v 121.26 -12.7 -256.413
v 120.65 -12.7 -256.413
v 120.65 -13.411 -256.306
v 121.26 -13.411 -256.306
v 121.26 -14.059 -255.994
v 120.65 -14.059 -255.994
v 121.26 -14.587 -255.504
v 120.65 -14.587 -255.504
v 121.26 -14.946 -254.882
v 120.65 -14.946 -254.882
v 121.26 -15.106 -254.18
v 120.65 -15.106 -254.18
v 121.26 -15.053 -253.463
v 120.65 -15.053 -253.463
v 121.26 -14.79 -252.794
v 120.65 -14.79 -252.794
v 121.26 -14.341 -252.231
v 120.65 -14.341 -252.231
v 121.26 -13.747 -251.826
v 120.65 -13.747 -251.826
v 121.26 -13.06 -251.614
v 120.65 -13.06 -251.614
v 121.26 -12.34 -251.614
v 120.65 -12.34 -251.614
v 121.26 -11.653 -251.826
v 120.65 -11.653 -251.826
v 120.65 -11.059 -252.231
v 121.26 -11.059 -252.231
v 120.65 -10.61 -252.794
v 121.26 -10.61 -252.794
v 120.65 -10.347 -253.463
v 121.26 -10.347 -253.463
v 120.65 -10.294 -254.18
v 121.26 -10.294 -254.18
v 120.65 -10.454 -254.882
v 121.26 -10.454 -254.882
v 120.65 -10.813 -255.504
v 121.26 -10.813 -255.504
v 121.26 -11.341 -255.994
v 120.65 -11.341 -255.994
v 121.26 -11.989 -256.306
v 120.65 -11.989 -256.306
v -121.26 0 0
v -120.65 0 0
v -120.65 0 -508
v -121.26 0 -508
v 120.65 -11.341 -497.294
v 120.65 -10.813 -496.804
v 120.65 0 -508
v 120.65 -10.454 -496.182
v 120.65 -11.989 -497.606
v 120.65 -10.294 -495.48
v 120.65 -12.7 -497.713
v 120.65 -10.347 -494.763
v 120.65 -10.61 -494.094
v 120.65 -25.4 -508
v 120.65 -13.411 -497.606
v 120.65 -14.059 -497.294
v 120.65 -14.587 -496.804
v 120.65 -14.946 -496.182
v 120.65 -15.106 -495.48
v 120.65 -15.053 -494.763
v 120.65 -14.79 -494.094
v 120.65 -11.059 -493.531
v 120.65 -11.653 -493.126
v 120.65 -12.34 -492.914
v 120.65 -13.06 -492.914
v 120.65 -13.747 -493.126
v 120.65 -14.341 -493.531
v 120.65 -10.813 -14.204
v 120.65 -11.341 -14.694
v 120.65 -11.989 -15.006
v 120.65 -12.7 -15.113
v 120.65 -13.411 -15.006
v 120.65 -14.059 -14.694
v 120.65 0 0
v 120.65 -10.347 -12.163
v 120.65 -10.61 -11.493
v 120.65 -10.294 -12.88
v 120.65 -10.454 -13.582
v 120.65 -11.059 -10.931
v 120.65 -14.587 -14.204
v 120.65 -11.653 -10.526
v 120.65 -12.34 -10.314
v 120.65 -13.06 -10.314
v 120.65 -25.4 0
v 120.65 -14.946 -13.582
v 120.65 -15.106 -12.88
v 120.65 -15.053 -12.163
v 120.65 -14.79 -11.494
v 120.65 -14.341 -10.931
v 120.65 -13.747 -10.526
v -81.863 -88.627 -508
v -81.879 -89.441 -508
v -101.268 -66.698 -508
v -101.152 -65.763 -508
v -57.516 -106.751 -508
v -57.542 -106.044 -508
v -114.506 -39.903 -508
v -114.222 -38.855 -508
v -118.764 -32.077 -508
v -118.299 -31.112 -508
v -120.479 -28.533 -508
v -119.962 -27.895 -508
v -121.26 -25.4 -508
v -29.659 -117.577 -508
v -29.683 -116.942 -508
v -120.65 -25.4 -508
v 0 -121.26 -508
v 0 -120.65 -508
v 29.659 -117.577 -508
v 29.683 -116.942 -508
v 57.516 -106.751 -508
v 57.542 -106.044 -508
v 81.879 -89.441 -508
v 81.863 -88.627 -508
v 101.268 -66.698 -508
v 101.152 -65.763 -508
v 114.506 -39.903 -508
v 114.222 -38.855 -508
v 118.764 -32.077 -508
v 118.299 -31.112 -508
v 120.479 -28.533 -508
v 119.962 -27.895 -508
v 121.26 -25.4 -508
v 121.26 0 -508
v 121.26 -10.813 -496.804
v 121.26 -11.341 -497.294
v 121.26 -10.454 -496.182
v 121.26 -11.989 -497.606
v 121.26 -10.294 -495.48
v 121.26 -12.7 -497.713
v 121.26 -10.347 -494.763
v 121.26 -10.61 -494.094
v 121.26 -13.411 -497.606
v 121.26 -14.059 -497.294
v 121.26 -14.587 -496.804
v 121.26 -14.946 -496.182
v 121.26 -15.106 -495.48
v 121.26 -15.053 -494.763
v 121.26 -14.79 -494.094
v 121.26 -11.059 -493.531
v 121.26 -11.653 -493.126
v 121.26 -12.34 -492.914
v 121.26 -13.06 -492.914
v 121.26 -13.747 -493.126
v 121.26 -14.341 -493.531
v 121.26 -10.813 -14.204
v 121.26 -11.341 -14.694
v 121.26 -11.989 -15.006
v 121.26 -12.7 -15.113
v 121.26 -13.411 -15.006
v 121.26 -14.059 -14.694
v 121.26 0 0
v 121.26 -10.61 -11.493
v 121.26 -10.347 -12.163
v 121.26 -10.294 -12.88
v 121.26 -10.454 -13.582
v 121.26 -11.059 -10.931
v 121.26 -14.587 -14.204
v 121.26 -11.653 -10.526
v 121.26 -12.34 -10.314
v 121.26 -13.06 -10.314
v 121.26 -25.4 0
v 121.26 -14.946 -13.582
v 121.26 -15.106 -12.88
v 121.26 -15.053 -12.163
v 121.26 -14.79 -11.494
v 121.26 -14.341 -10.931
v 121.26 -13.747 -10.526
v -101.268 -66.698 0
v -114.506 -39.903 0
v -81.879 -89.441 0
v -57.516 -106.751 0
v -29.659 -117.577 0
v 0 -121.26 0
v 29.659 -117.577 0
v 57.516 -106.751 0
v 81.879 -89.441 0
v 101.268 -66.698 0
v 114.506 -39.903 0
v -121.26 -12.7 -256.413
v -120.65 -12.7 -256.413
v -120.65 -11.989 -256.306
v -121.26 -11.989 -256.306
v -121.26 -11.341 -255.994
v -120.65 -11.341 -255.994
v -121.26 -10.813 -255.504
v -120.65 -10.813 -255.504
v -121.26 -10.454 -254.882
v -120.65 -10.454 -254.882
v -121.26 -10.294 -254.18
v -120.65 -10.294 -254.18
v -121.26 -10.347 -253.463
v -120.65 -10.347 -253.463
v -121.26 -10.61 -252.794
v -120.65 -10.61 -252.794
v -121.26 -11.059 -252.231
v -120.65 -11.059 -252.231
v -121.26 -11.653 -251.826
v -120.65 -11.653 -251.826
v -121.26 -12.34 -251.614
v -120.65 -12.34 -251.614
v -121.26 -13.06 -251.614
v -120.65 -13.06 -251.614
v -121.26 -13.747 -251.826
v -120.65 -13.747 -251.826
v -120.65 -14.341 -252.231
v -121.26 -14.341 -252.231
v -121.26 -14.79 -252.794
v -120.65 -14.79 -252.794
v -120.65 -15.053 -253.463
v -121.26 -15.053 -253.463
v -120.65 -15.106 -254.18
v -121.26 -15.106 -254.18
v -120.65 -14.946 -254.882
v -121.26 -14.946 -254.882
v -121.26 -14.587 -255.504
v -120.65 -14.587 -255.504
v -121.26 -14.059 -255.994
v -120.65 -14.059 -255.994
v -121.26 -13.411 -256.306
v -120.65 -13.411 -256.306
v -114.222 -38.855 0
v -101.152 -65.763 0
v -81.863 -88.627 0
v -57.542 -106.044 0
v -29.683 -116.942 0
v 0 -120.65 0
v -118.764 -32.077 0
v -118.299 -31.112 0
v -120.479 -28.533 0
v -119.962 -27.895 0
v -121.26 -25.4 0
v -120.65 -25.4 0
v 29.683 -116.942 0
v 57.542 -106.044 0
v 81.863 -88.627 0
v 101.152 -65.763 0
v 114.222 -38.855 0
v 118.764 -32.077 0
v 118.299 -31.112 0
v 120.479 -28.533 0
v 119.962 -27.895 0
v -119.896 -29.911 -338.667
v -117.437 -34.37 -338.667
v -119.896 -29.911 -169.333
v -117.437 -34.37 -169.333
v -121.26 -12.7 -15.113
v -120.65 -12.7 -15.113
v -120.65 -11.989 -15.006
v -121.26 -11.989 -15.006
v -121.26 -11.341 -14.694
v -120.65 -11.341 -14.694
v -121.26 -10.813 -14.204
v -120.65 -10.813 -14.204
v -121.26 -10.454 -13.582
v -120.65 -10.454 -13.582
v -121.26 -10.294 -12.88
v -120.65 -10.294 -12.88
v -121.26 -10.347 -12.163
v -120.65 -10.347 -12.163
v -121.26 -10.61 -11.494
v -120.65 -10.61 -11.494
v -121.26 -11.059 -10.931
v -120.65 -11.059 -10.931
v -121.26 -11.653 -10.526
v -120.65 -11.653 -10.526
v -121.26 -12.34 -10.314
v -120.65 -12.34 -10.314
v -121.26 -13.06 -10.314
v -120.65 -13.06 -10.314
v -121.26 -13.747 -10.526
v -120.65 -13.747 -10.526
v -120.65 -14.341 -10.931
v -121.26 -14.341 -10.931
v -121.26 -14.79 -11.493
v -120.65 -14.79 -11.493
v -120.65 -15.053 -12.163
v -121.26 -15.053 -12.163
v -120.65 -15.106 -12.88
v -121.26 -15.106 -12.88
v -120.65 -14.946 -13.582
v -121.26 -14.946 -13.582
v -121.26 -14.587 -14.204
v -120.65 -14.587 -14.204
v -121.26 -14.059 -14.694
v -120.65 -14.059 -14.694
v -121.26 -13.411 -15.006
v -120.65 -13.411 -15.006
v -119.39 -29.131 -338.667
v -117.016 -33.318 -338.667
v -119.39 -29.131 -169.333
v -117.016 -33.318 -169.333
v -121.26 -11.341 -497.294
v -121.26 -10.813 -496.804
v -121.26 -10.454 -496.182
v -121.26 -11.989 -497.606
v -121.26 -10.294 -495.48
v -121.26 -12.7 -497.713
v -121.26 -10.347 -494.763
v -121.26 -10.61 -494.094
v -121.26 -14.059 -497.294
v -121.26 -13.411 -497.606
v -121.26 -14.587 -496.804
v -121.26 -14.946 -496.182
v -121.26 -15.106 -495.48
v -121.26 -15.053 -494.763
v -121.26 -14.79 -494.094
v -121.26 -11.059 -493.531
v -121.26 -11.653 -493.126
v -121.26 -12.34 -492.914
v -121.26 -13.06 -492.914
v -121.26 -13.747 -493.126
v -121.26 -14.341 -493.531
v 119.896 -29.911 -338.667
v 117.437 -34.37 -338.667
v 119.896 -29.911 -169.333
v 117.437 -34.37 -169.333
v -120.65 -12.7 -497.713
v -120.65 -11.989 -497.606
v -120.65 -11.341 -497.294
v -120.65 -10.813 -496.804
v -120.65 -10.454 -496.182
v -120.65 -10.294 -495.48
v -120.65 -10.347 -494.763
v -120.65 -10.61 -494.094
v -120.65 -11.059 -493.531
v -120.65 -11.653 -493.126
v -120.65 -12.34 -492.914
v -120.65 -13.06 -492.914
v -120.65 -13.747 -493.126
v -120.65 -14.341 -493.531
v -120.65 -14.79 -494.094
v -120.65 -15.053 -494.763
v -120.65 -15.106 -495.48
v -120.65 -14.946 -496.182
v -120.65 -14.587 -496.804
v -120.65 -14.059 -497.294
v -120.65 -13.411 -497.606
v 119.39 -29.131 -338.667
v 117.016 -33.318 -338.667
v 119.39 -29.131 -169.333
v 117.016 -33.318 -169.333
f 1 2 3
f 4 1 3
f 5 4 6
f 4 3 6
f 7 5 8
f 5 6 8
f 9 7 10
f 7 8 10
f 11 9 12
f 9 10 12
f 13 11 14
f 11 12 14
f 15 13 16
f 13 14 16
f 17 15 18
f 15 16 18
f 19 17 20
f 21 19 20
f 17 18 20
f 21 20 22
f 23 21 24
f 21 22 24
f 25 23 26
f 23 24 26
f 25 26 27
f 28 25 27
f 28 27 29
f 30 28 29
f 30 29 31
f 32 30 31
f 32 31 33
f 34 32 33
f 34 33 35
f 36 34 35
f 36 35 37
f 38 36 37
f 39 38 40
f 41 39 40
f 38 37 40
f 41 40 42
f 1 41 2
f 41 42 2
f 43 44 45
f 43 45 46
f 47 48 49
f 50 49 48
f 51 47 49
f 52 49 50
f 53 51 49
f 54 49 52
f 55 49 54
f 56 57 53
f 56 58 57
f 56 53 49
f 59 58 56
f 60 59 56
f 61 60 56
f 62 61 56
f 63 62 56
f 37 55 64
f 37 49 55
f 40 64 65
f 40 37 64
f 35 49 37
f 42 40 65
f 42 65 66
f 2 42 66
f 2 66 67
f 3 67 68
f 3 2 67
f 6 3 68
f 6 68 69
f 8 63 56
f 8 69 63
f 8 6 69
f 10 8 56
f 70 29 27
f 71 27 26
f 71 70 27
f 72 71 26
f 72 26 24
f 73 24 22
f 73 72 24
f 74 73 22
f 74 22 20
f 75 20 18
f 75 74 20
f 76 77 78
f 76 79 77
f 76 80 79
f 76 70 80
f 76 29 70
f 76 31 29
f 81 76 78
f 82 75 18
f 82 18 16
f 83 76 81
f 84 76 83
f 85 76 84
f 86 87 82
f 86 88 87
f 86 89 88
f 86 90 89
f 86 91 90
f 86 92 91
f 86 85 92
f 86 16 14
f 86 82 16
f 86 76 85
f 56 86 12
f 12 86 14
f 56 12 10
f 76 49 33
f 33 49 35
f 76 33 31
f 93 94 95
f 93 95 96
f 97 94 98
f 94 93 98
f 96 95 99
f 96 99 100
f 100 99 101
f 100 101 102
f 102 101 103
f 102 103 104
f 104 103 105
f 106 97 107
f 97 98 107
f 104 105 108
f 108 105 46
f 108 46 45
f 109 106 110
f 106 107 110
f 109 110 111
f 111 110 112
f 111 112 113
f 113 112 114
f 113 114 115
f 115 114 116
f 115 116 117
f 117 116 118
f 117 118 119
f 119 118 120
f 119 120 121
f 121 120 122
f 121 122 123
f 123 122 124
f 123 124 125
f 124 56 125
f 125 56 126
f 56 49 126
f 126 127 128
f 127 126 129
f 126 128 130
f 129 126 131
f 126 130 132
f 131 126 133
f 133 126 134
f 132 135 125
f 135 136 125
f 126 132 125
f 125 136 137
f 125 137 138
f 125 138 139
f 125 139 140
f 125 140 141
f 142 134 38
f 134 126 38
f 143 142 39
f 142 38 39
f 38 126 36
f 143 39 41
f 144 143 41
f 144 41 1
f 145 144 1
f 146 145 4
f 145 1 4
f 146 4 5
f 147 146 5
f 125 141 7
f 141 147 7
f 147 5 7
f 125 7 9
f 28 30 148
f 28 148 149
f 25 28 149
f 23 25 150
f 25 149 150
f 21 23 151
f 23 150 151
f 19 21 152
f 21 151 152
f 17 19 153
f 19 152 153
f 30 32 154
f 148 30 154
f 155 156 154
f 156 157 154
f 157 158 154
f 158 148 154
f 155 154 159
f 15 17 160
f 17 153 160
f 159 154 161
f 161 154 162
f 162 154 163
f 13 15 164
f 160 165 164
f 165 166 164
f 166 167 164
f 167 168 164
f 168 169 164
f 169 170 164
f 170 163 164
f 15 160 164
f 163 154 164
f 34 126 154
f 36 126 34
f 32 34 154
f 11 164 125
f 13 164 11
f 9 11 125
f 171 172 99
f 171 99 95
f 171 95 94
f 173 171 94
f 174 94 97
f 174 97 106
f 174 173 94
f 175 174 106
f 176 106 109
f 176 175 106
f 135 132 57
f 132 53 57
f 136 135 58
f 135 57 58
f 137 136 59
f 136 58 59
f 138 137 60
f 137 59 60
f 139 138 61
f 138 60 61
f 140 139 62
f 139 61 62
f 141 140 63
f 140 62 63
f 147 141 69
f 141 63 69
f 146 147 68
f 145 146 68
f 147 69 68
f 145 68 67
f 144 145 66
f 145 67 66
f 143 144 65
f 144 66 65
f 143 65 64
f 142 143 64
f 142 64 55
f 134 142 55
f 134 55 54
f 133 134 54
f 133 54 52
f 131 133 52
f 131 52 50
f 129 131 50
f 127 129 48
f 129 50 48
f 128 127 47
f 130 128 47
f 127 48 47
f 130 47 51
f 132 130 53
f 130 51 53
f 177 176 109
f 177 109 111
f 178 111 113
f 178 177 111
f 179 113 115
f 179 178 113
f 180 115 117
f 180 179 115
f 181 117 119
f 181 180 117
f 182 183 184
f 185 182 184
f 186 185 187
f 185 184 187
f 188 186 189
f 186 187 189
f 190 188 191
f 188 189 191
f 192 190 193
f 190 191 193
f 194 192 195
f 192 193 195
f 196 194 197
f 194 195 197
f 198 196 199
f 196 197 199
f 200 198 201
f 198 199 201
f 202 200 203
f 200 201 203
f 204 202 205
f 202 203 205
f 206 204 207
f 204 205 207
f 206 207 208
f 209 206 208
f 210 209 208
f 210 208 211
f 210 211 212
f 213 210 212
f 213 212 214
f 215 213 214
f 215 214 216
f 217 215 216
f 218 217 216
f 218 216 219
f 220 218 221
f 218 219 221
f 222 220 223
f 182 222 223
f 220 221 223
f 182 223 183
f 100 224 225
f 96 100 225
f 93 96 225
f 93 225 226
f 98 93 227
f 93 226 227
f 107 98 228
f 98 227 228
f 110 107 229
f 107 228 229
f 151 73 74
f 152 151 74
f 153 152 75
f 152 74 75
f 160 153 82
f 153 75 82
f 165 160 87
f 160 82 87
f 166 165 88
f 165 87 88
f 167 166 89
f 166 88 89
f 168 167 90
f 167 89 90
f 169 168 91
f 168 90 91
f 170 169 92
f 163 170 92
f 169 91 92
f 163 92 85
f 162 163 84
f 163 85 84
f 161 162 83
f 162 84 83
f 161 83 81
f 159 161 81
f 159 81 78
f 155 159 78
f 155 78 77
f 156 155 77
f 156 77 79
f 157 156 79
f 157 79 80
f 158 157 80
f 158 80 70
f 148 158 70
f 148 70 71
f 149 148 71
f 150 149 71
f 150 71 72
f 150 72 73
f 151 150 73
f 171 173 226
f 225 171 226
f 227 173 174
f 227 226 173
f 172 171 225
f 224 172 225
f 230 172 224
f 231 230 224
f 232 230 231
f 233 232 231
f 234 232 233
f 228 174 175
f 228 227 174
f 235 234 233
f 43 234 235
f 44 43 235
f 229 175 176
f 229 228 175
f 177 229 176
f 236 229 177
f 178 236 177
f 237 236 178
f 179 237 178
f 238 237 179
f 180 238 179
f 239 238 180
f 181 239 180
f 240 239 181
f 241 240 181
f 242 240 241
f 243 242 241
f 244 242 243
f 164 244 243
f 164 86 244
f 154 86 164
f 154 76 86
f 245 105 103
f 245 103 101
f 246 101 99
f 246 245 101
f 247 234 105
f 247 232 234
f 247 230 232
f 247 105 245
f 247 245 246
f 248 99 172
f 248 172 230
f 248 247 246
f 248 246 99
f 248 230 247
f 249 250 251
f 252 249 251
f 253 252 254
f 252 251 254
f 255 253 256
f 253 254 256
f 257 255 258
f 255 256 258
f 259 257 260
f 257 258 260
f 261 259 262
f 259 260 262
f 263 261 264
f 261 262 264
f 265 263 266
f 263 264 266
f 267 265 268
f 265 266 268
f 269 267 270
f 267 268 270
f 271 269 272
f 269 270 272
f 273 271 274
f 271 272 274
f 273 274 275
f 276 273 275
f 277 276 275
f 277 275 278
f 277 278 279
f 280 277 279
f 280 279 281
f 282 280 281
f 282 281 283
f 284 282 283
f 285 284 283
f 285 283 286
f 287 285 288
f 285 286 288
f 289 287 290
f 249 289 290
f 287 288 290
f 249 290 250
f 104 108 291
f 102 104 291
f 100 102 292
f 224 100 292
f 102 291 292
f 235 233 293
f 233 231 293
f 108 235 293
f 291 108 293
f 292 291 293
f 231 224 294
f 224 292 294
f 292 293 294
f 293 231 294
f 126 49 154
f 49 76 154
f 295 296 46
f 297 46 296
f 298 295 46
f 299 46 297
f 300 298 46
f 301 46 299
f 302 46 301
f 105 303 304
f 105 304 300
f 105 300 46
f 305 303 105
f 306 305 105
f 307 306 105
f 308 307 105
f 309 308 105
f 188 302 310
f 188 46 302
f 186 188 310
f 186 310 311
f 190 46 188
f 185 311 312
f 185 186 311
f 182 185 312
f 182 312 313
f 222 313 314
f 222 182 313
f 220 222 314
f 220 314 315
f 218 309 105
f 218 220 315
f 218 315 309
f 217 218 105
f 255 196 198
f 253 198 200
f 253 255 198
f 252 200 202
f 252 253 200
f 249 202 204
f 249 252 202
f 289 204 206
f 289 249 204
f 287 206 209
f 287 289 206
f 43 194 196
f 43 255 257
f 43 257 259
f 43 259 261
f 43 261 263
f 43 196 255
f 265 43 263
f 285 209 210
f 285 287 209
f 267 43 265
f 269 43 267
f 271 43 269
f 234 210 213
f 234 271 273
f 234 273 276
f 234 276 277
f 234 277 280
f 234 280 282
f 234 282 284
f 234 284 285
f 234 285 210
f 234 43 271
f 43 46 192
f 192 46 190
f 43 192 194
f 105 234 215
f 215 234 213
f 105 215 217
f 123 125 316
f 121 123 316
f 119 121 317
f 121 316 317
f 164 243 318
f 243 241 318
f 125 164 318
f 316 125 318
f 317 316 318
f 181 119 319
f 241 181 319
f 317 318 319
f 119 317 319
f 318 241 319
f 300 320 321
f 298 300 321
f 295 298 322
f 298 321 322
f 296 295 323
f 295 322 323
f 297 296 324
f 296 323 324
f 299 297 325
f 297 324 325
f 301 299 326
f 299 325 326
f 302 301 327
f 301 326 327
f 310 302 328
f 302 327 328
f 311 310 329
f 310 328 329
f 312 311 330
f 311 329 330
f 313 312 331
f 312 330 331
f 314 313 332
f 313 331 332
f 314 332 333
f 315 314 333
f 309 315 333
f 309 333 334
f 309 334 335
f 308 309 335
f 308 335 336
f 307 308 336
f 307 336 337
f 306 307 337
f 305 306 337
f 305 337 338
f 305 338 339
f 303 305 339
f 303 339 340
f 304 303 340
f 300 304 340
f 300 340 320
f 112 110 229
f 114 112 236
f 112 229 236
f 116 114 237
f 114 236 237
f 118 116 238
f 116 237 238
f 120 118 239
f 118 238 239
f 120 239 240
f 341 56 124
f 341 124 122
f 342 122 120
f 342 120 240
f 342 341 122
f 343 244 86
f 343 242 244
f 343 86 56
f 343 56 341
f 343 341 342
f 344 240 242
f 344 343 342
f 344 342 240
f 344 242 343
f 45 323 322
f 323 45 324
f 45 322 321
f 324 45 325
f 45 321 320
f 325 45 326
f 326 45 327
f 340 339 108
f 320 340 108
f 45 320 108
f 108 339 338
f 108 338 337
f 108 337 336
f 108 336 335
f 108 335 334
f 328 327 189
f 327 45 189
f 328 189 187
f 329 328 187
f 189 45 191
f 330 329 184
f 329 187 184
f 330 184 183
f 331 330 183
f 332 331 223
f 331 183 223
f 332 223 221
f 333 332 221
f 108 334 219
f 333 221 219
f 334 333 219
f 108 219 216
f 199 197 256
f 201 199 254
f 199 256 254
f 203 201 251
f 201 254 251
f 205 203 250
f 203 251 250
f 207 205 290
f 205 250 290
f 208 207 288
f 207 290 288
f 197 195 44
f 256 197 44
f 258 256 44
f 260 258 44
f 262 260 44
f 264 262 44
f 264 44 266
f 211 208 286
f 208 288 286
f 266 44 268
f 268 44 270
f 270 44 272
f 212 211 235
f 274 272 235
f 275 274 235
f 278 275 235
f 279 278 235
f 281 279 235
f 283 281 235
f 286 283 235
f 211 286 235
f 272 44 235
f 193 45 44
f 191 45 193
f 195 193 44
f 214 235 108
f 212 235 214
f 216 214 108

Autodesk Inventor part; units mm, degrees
ref_plane "YZ Plane" through (0, 0, 0) normal (1, 0, 0) x (0, 1, 0)
ref_plane "XZ Plane" through (0, 0, 0) normal (0, 1, 0) x (-1, 0, 0)
ref_plane "XY Plane" through (0, 0, 0) normal (0, 0, 1) x (1, 0, 0)
sketch "Sketch1" plane through (0, 0, 0) normal (0, 0, 1) x (1, 0, 0)
  arc A0 (-114.2223, -38.8548) -> (0, -120.65) centre (0, 0) ccw
  line L0 (-120.65, 0) -> (-121.2596, 0)
  line L1 (120.65, 0) -> (121.2596, 0)
  line L2 (-121.2596, 0) -> (-121.2596, -25.4)
  line L3 (-120.65, 0) -> (-120.65, -25.4)
  line L4 (-121.2596, -25.4) -> (-120.65, -30.3117) construction
  line L5 (-120.65, -30.3117) -> (-117.4666, -33.4581) construction
  line L6 (-117.4666, -33.4581) -> (-114.5061, -39.9028) construction
  spline S0 degree 3 poles (-121.2596, -25.4) (-120.65, -30.3117) (-117.4666, -33.4581) (-114.5061, -39.9028) knots 1 1 1 1 2 2 2 2
  line L7 (-120.65, -25.4) -> (-120.1784, -29.1998) construction
  line L8 (-120.1784, -29.1998) -> (-116.9951, -32.3462) construction
  line L9 (-116.9951, -32.3462) -> (-114.2223, -38.8548) construction
  spline S1 degree 3 poles (-120.65, -25.4) (-120.1784, -29.1998) (-116.9951, -32.3462) (-114.2223, -38.8548) knots 1 1 1 1 2 2 2 2
  arc A1 (-114.5061, -39.9028) -> (0, -121.2596) centre (0, 0) ccw
  line L10 (0, 0) -> (0, -121.2596)
  arc A2 (0, -120.65) -> (114.2223, -38.8548) centre (0, 0) ccw
  line L11 (120.65, 0) -> (121.2596, 0)
  line L12 (121.2596, 0) -> (121.2596, -25.4)
  line L13 (120.65, 0) -> (120.65, -25.4)
  line L14 (121.2596, -25.4) -> (120.65, -30.3117) construction
  line L15 (120.65, -30.3117) -> (117.4666, -33.4581) construction
  line L16 (117.4666, -33.4581) -> (114.5061, -39.9028) construction
  spline S2 degree 3 poles (121.2596, -25.4) (120.65, -30.3117) (117.4666, -33.4581) (114.5061, -39.9028) knots 1 1 1 1 2 2 2 2
  spline S3 degree 3 poles (120.65, -25.4) (120.1784, -29.1998) (116.9951, -32.3462) (114.2223, -38.8548) knots 1 1 1 1 2 2 2 2
  line L17 (120.65, -25.4) -> (120.1784, -29.1998) construction
  line L18 (120.1784, -29.1998) -> (116.9951, -32.3462) construction
  line L19 (116.9951, -32.3462) -> (114.2223, -38.8548) construction
  arc A3 (0, -121.2596) -> (114.5061, -39.9028) centre (0, 0) ccw
  dimension "d0" = 241.3
  dimension "d1" = 0.6096
  dimension "d2" = 0.6096
  dimension "d5" = 25.4
  dimension "d6" = 25.4
  dimension "d7" = 1.1119
  dimension "d8" = 1.1119
  dimension "d9" = 3.1463
  dimension "d10" = 3.1833
  dimension "d11" = 0.6096
  dimension "d12" = 3.1833
  dimension "d14" = 14.5028
  dimension "d15" = 3.7998
extrude "Extrusion1" add sketch "Sketch1" against normal blind 508
sketch "Sketch2" plane through (-120.65, -25.4, 0) normal (1, 0, 0) x (0, 0, -1)
  line L0 (0, 25.4) -> (0, 0) projected
  line L1 (0, 25.4) -> (508, 25.4) projected
  line L2 (508, 0) -> (508, 25.4) projected
  line L3 (0, 0) -> (508, 0) projected
  circle A0 centre (12.7, 12.7) radius 2.413
  circle A1 centre (254, 12.7) radius 2.413
  circle A2 centre (495.3, 12.7) radius 2.413
  dimension "d18" = 4.826
  dimension "d19" = 12.7
  dimension "d20" = 12.7
  dimension "d23" = 241.3
extrude "Extrusion2" cut sketch "Sketch2" along normal mid plane 560.3875 contours A0 | A1 | A2
properties part number "Ballslide"
